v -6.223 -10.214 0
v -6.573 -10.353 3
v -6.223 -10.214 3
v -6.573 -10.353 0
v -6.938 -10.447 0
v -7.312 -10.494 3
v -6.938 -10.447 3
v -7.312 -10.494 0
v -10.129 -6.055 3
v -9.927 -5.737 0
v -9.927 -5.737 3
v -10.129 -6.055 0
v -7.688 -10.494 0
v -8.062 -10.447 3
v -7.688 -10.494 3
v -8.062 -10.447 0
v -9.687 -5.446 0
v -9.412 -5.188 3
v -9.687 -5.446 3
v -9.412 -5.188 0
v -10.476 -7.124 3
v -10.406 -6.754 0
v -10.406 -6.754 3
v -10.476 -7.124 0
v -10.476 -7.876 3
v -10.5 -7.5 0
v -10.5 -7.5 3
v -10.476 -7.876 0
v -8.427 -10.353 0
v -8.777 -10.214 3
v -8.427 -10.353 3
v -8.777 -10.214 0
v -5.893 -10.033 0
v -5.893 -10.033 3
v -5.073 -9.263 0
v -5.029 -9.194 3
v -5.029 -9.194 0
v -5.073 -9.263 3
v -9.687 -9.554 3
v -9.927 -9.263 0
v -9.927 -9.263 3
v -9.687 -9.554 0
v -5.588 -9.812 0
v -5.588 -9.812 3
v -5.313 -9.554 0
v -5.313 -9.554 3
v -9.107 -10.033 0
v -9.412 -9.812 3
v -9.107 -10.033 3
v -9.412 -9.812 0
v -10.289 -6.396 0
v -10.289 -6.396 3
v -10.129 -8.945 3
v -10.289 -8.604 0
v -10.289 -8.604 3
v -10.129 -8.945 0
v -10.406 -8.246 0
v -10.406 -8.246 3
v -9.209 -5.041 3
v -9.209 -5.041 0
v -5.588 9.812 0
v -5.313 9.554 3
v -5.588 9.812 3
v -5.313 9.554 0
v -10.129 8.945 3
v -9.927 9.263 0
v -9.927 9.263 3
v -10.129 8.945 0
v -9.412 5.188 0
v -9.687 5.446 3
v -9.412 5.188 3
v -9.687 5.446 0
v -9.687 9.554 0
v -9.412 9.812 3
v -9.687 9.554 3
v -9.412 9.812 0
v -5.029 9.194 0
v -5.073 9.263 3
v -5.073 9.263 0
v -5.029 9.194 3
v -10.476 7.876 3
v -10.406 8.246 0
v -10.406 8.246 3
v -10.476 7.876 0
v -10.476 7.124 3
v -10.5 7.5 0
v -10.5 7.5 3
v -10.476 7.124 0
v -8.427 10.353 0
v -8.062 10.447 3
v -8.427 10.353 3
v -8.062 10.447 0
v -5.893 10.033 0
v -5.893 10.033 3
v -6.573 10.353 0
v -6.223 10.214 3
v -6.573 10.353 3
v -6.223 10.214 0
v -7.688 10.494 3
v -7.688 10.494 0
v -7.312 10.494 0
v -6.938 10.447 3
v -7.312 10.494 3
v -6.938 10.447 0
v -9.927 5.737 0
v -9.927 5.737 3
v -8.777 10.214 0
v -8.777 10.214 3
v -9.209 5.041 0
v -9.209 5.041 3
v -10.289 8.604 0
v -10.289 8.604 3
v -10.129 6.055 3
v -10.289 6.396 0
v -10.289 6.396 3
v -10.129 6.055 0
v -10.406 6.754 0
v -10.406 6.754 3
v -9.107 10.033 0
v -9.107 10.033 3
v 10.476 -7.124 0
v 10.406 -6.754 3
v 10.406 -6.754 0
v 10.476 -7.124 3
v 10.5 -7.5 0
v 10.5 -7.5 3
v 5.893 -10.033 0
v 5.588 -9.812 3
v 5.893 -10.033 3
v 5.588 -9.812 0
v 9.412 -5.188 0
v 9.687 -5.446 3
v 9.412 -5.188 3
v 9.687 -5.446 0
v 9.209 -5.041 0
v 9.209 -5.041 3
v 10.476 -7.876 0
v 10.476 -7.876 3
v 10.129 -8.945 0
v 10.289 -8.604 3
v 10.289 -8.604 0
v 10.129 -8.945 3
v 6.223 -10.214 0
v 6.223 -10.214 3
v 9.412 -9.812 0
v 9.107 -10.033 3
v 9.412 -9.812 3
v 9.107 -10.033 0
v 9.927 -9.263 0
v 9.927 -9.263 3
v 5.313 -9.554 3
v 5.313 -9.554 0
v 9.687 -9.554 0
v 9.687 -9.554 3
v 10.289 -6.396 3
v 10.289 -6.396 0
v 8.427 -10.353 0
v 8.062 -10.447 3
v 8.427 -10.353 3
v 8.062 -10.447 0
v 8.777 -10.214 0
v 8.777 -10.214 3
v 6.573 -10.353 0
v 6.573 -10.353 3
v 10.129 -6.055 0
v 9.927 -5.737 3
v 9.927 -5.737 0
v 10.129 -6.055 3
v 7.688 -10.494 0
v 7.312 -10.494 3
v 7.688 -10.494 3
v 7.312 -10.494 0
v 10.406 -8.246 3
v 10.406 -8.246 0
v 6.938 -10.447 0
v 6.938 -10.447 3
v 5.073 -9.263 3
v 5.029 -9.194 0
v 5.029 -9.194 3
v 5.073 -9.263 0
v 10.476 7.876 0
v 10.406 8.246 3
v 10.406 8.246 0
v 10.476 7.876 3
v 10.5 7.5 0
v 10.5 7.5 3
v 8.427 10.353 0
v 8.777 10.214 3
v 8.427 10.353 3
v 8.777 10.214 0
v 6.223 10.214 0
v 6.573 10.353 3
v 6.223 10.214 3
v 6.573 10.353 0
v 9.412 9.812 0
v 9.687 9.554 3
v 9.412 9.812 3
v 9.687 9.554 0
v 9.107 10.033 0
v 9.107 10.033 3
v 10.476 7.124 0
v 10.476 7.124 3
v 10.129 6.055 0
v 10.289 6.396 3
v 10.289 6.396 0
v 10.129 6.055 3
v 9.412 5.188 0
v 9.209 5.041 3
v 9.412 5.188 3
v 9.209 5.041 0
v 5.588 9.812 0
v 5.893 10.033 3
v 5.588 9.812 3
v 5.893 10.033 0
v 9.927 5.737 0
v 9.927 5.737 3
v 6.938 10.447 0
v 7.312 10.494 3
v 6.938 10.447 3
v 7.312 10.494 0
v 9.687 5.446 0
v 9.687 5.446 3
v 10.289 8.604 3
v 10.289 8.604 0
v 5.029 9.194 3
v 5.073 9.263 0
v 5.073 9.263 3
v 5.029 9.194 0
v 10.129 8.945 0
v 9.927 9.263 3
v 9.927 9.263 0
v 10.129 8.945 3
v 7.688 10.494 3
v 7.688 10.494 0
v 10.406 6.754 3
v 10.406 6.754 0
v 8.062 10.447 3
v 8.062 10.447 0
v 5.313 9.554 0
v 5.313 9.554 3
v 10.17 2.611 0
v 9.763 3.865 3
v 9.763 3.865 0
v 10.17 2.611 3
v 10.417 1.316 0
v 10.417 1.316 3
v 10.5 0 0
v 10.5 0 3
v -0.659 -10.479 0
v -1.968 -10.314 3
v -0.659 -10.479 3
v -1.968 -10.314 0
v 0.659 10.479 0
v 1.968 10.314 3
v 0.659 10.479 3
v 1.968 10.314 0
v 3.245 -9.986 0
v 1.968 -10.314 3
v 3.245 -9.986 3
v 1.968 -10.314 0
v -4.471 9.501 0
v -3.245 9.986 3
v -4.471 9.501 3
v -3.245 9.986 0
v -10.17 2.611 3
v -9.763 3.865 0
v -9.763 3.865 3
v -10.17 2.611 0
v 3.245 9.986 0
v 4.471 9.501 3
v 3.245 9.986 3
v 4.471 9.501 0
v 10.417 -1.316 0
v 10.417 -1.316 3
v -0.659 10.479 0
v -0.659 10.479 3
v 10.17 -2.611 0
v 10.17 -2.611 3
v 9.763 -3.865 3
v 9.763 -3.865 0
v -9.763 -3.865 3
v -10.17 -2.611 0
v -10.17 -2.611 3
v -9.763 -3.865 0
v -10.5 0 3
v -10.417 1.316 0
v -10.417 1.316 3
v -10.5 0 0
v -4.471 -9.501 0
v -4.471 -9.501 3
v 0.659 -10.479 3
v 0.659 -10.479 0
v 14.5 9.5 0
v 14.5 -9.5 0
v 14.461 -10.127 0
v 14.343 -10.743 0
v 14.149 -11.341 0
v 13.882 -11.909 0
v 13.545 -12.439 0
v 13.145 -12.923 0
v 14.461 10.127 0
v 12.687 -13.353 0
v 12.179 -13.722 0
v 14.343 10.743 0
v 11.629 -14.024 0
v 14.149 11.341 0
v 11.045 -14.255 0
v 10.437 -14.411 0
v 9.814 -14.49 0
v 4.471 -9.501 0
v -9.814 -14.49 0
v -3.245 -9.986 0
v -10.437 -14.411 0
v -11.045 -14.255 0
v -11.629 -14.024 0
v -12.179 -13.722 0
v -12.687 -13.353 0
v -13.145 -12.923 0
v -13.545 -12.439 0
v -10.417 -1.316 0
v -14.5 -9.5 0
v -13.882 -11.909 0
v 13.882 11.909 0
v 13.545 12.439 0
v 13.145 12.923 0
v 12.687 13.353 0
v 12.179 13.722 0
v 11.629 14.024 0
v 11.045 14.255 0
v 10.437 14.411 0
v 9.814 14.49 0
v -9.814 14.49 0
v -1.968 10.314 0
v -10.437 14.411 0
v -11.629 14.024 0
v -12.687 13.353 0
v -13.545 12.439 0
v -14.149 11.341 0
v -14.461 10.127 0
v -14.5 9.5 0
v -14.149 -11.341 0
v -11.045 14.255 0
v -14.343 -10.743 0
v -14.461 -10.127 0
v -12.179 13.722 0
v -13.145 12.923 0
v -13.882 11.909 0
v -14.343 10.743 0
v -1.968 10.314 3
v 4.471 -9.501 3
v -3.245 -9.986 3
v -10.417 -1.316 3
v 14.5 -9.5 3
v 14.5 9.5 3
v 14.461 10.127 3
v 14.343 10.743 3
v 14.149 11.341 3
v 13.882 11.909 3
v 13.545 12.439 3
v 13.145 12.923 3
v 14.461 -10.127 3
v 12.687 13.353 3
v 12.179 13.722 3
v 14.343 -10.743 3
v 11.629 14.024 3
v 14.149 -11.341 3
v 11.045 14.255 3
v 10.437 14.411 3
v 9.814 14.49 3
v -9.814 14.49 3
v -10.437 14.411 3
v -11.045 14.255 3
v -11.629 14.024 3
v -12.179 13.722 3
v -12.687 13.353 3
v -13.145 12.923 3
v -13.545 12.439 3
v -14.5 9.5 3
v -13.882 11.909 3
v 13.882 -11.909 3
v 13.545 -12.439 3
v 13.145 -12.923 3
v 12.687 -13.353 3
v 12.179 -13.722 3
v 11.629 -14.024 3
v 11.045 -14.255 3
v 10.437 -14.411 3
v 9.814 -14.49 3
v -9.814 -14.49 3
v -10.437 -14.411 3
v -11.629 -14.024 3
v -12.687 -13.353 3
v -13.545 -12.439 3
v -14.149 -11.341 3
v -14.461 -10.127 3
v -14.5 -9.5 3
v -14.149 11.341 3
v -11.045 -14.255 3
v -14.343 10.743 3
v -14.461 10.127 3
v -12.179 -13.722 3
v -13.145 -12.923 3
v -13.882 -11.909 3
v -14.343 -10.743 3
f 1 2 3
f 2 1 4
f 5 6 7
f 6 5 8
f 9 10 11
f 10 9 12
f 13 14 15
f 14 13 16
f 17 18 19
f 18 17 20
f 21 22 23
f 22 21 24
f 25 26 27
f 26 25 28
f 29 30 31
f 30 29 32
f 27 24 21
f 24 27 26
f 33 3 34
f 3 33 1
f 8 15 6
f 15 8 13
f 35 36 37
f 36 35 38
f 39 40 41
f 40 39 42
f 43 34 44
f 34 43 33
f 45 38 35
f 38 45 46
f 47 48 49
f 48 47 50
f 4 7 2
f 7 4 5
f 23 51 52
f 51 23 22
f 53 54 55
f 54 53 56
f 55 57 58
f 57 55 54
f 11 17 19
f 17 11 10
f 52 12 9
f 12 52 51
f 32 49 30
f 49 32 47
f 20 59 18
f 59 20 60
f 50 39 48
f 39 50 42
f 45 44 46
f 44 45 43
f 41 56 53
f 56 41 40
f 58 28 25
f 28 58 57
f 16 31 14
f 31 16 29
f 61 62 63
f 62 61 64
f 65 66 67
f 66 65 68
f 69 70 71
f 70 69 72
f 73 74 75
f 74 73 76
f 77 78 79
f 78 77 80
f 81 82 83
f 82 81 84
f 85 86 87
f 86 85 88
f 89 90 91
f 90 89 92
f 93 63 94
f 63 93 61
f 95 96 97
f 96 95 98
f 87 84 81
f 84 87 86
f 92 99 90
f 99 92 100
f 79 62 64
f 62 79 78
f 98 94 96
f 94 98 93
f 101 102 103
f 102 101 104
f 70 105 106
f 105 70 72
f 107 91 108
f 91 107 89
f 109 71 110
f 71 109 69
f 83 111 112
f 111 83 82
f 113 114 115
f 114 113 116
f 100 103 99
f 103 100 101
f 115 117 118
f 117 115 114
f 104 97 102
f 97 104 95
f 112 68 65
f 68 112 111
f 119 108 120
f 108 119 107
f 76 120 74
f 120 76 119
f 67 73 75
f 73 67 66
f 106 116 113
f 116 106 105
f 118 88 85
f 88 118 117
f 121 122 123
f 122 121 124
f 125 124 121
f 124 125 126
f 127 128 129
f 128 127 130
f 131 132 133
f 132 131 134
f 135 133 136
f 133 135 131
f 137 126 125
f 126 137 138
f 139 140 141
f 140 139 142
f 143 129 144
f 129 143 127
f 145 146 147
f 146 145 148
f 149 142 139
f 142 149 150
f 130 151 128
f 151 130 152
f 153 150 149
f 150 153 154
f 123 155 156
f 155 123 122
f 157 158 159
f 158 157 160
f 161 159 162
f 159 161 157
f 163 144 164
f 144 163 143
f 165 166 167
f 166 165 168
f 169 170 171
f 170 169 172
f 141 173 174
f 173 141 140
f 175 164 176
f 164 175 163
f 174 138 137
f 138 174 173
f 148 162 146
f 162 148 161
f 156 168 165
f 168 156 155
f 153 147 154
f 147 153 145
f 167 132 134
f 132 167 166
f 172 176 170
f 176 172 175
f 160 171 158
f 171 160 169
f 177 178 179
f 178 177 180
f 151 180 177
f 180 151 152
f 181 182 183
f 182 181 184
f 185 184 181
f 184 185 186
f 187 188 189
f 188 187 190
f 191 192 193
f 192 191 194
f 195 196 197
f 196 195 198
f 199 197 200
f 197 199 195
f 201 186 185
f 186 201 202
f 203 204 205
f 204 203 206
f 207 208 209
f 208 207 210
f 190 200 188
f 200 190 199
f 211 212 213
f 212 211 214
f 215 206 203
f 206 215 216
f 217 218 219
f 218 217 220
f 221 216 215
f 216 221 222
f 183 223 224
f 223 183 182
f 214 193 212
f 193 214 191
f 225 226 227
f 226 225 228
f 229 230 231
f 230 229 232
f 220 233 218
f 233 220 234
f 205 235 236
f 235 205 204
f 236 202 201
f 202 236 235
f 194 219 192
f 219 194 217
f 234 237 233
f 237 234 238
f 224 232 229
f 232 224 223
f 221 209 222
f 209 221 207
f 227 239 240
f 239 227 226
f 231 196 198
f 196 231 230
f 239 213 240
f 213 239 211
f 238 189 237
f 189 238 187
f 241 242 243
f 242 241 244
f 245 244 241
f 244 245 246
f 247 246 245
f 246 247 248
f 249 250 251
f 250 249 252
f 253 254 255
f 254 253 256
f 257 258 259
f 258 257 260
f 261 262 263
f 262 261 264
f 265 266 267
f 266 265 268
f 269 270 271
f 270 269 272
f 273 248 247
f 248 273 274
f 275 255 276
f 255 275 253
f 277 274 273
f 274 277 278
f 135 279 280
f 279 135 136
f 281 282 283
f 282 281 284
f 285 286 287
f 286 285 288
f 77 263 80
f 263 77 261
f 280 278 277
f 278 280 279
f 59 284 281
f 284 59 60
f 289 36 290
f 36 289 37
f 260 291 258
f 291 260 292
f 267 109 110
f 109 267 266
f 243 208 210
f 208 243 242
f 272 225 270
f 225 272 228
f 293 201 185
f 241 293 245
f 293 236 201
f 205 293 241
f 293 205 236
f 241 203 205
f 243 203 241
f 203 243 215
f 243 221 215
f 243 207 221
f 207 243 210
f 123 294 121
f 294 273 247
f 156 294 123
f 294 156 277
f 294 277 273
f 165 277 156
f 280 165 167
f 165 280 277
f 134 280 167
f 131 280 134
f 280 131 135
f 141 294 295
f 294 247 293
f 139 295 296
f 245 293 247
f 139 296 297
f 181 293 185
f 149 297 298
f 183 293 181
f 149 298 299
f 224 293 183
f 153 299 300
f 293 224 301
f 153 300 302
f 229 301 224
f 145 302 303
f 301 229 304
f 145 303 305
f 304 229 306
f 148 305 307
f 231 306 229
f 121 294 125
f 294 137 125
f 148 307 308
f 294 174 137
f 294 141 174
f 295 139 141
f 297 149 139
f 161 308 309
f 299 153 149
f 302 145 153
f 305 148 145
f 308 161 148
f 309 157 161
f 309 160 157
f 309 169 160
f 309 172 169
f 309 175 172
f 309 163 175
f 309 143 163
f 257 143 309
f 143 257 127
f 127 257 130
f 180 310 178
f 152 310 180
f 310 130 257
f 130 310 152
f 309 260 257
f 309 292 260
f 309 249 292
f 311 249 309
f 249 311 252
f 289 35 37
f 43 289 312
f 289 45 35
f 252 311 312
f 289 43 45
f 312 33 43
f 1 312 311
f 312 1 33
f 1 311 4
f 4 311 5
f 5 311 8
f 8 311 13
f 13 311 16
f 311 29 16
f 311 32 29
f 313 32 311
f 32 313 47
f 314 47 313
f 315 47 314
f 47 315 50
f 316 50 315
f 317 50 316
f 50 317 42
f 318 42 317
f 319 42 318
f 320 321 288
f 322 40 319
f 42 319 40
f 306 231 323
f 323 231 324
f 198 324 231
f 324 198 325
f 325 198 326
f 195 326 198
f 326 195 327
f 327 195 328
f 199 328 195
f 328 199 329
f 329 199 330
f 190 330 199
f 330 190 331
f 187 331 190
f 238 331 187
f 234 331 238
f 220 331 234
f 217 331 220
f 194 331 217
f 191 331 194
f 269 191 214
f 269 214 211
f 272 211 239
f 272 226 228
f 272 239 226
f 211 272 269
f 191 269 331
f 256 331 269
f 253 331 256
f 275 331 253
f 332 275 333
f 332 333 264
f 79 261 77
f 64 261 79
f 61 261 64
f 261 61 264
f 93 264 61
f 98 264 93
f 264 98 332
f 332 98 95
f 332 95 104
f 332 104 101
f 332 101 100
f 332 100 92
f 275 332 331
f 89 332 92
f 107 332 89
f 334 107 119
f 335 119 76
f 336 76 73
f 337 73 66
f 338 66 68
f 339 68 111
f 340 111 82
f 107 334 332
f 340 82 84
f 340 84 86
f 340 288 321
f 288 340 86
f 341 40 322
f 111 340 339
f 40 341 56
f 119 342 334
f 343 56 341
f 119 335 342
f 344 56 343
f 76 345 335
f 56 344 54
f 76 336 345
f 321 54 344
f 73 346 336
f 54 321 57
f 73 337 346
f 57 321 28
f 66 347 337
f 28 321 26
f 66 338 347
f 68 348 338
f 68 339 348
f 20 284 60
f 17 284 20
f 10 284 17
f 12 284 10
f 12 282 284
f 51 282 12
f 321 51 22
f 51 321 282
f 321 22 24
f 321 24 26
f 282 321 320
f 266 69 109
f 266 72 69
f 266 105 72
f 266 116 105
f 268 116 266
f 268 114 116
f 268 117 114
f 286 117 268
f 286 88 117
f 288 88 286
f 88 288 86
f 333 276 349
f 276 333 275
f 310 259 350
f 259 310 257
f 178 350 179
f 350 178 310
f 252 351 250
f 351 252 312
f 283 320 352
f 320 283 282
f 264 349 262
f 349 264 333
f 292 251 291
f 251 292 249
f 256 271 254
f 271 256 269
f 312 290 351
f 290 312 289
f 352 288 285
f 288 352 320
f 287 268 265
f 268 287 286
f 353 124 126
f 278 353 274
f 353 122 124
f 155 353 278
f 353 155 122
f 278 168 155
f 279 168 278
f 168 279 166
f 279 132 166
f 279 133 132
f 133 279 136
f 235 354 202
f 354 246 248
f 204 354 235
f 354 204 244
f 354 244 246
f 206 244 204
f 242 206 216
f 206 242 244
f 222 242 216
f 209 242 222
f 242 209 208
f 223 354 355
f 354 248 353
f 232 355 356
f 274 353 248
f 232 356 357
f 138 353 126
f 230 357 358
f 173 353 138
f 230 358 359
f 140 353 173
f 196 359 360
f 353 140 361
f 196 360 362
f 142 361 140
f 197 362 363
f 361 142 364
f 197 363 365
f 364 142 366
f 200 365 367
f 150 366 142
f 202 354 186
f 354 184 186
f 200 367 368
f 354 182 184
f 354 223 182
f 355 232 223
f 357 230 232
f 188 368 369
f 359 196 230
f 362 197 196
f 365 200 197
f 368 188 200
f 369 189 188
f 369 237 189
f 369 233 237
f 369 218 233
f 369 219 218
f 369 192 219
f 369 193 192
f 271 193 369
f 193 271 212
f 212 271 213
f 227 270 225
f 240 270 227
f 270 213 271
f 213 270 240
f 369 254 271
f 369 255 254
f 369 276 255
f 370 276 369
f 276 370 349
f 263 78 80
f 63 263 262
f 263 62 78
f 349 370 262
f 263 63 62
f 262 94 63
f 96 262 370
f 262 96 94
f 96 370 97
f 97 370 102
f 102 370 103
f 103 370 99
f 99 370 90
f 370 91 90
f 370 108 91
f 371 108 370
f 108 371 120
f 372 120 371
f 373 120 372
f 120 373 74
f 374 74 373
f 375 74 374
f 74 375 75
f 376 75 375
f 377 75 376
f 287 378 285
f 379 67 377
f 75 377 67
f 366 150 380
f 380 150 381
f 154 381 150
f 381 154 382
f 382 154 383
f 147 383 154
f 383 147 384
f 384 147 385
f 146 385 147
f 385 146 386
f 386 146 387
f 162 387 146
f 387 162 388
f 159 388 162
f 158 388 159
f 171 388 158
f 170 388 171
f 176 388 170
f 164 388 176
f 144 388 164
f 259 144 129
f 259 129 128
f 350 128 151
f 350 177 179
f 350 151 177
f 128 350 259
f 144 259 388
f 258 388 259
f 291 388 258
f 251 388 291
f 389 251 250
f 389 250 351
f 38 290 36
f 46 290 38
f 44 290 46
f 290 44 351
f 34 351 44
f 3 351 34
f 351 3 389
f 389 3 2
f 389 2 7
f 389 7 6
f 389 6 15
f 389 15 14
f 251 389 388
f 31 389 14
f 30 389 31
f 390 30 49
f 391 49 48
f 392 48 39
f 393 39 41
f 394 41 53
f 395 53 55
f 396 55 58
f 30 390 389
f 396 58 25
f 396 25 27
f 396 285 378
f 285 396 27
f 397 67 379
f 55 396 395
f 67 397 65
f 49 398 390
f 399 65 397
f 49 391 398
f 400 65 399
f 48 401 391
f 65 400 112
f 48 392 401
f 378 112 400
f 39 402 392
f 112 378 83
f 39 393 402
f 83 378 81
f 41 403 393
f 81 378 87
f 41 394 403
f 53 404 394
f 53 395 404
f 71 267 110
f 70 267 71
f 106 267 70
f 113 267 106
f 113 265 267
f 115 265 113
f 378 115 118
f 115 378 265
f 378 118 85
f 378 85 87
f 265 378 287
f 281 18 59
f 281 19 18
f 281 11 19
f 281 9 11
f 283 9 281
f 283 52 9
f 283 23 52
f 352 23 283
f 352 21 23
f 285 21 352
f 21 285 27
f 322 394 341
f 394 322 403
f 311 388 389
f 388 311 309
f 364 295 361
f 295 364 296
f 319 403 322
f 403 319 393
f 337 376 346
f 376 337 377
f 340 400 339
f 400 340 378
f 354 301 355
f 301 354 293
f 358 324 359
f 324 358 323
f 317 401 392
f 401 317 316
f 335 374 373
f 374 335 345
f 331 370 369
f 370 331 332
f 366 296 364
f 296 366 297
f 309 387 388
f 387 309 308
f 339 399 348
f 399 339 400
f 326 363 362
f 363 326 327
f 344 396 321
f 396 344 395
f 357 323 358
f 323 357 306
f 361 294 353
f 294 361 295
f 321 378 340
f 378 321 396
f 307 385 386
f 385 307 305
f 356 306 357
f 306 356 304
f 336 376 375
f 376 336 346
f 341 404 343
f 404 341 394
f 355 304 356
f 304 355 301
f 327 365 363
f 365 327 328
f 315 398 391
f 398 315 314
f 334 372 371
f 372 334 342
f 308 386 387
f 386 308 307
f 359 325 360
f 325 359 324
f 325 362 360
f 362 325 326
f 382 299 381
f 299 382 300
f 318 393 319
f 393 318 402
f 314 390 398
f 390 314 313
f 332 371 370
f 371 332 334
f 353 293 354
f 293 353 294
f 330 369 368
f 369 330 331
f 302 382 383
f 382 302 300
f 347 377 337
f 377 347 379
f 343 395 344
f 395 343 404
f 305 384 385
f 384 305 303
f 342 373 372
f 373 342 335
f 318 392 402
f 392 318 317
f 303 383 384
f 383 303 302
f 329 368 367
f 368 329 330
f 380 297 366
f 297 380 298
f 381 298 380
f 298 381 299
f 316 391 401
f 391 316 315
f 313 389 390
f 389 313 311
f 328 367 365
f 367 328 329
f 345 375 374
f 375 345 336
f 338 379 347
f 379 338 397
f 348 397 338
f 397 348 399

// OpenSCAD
$fn = 50;


difference() {
	union() {
		hull() {
			translate(v = [-9.5000000000, 9.5000000000, 0]) {
				cylinder(h = 3, r = 5);
			}
			translate(v = [9.5000000000, 9.5000000000, 0]) {
				cylinder(h = 3, r = 5);
			}
			translate(v = [-9.5000000000, -9.5000000000, 0]) {
				cylinder(h = 3, r = 5);
			}
			translate(v = [9.5000000000, -9.5000000000, 0]) {
				cylinder(h = 3, r = 5);
			}
		}
	}
	union() {
		#translate(v = [-7.5000000000, -7.5000000000, -100.0000000000]) {
			cylinder(h = 200, r = 3.0000000000);
		}
		#translate(v = [-7.5000000000, 7.5000000000, -100.0000000000]) {
			cylinder(h = 200, r = 3.0000000000);
		}
		#translate(v = [7.5000000000, -7.5000000000, -100.0000000000]) {
			cylinder(h = 200, r = 3.0000000000);
		}
		#translate(v = [7.5000000000, 7.5000000000, -100.0000000000]) {
			cylinder(h = 200, r = 3.0000000000);
		}
		#cylinder(h = 3, r = 10.5000000000);
	}
}
